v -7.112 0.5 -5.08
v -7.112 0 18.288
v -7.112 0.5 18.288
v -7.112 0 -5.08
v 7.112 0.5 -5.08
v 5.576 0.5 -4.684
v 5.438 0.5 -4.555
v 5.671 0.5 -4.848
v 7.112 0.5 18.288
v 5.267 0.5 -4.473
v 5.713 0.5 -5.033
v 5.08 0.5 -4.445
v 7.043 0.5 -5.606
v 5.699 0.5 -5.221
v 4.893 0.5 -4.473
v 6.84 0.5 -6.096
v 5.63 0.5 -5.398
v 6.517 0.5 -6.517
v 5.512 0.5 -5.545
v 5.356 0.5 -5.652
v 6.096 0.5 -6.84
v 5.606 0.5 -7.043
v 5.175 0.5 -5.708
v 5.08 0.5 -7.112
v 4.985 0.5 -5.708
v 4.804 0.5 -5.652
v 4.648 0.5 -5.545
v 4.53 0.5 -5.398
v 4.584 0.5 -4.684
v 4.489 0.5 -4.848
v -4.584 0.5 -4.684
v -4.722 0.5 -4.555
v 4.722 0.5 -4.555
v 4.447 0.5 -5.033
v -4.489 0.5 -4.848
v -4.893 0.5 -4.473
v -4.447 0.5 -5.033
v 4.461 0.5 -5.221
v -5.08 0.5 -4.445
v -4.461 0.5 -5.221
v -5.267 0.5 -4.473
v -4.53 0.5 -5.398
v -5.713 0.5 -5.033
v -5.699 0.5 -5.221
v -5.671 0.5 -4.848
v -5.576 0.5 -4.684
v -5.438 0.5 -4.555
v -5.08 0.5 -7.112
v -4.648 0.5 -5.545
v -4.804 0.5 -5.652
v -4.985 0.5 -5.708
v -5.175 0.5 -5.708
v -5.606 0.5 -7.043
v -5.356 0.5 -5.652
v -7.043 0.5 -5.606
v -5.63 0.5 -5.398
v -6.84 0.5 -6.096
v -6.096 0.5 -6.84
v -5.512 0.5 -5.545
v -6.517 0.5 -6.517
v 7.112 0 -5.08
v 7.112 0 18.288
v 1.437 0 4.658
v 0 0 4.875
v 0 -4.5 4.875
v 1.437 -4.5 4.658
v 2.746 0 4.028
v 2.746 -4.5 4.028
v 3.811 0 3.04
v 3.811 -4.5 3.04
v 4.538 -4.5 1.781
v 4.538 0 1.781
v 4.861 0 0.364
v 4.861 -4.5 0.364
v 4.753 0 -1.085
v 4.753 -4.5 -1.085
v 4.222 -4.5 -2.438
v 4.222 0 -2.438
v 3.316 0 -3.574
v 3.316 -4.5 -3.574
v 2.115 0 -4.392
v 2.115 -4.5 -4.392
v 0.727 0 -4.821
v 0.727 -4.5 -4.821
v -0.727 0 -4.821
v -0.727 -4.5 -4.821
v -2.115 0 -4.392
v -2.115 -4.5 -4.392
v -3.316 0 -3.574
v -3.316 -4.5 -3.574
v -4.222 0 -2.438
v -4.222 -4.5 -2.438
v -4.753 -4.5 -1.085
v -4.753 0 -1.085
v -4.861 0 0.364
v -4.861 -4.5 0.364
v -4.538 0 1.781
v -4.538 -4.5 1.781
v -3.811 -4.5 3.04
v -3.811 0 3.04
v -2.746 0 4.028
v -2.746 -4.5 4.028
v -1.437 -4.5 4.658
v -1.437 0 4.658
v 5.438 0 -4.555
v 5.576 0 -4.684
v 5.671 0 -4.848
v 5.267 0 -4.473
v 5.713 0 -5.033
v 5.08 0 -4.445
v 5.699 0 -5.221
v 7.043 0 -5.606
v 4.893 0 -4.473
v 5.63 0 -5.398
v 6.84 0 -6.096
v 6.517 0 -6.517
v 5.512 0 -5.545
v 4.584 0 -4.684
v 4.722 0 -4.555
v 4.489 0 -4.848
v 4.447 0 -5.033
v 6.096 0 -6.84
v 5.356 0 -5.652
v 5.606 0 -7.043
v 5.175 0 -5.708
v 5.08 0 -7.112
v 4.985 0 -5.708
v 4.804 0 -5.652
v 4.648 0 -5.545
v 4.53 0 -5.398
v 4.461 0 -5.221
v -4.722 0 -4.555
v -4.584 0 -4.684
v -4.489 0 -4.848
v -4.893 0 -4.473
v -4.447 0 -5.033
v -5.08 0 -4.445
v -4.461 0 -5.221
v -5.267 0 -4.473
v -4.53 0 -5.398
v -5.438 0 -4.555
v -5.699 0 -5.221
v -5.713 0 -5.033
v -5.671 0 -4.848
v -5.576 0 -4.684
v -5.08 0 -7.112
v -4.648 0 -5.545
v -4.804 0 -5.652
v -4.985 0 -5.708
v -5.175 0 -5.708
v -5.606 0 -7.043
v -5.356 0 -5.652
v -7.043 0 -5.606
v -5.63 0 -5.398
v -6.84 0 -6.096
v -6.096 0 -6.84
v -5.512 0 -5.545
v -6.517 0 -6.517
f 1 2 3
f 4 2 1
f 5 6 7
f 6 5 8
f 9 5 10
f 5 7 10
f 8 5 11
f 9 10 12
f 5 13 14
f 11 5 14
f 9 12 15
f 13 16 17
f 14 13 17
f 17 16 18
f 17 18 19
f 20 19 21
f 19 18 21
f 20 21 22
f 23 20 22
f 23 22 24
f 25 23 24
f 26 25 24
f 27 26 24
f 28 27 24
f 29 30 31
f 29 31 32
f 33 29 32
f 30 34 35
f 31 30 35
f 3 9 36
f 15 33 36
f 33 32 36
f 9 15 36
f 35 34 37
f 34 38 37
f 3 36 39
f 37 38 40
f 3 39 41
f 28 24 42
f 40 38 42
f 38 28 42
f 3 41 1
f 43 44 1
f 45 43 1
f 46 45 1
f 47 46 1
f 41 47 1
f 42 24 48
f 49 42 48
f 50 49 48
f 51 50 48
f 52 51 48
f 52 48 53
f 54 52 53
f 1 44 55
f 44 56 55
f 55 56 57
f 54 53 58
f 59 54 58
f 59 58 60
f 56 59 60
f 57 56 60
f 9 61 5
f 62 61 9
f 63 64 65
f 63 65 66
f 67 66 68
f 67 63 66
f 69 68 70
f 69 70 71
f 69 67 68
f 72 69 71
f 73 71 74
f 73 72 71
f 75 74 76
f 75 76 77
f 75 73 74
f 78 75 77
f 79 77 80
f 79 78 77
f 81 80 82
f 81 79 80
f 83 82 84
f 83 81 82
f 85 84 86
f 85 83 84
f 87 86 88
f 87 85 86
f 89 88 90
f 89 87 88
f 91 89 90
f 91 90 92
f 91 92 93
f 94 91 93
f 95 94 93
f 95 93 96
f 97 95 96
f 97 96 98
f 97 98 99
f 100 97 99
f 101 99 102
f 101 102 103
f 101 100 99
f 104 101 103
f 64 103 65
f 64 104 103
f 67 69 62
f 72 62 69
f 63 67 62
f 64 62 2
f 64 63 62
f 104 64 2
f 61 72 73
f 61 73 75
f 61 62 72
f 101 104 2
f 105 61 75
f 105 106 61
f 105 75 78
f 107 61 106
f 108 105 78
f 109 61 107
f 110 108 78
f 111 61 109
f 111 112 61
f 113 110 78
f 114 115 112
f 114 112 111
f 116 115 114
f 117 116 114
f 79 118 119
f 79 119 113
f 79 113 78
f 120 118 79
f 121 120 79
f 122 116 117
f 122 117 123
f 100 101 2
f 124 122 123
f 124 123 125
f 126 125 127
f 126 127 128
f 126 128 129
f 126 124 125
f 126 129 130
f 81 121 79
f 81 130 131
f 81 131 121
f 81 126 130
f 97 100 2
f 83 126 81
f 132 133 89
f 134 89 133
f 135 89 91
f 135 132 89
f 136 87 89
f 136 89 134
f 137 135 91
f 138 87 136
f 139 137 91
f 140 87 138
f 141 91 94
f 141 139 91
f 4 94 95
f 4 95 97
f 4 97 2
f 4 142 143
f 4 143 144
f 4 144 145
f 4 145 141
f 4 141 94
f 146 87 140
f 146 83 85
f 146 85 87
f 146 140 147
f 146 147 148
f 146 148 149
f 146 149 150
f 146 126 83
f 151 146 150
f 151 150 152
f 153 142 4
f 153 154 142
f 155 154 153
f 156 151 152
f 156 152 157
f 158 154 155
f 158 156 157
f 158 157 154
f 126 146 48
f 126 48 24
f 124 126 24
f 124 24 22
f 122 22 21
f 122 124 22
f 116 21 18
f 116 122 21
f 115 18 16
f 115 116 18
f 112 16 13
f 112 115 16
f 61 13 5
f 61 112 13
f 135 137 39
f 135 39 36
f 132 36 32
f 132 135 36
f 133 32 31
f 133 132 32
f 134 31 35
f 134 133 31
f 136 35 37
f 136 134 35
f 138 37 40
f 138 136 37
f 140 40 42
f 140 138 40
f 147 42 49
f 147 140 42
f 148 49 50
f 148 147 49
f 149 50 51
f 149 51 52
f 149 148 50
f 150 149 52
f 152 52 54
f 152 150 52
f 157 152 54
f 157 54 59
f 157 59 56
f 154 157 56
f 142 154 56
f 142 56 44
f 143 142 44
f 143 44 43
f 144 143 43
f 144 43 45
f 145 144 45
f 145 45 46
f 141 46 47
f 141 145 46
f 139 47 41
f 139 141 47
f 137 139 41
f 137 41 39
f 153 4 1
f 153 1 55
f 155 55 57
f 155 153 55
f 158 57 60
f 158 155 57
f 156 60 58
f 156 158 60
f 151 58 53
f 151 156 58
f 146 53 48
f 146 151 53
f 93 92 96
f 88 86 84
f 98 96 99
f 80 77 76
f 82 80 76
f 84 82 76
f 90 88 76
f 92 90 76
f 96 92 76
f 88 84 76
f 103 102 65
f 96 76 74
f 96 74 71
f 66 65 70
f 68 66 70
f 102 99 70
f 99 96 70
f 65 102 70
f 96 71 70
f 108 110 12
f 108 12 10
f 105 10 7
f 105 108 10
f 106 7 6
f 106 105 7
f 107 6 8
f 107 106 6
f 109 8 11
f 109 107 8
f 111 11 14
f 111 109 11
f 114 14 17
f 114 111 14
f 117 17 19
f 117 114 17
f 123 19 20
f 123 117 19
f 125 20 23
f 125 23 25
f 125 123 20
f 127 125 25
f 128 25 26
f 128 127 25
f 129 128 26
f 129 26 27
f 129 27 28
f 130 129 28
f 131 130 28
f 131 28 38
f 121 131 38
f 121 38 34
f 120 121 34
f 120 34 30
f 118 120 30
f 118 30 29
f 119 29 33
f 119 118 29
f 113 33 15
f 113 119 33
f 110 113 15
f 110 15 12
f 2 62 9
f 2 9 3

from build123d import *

# Parameters (mm, degrees)
SKETCH1_R           = 0.635
BOSS_EXTRUDE1_DEPTH = 0.5
SKETCH2_R           = 4.875
BOSS_EXTRUDE2_DEPTH = 4.5


with BuildPart() as part:
    # Sketch1 → Boss-Extrude1 (new body)
    with BuildSketch(Plane(origin=(0, 0, 0), x_dir=(1, 0, 0), z_dir=(0, 1, 0))):
        with BuildLine():
            Line((-5.08, 7.112), (5.08, 7.112))
            ThreePointArc((5.08, 7.112), (6.516840979, 6.516840979), (7.112, 5.08))
            Line((7.112, 5.08), (7.112, -18.288))
            Line((7.112, -18.288), (-7.112, -18.288))
            Line((-7.112, -18.288), (-7.112, 5.08))
            ThreePointArc((-7.112, 5.08), (-6.516840979, 6.516840979), (-5.08, 7.112))
        make_face()
        with Locations(Location((5.08, 5.08, 0), (0, 0, 270))):
            Circle(SKETCH1_R, mode=Mode.SUBTRACT)
        with Locations(Location((-5.08, 5.08, 0), (0, 0, 270))):
            Circle(SKETCH1_R, mode=Mode.SUBTRACT)
    extrude(amount=BOSS_EXTRUDE1_DEPTH)

    # Sketch2 → Boss-Extrude2 (add)
    with BuildSketch(Plane(origin=(0, 0, 0), x_dir=(1, 0, 0), z_dir=(0, 1, 0))):
        with Locations(Location((0, 0, 0), (0, 0, 270))):
            Circle(SKETCH2_R)
    extrude(amount=-BOSS_EXTRUDE2_DEPTH)


solid = part.part
